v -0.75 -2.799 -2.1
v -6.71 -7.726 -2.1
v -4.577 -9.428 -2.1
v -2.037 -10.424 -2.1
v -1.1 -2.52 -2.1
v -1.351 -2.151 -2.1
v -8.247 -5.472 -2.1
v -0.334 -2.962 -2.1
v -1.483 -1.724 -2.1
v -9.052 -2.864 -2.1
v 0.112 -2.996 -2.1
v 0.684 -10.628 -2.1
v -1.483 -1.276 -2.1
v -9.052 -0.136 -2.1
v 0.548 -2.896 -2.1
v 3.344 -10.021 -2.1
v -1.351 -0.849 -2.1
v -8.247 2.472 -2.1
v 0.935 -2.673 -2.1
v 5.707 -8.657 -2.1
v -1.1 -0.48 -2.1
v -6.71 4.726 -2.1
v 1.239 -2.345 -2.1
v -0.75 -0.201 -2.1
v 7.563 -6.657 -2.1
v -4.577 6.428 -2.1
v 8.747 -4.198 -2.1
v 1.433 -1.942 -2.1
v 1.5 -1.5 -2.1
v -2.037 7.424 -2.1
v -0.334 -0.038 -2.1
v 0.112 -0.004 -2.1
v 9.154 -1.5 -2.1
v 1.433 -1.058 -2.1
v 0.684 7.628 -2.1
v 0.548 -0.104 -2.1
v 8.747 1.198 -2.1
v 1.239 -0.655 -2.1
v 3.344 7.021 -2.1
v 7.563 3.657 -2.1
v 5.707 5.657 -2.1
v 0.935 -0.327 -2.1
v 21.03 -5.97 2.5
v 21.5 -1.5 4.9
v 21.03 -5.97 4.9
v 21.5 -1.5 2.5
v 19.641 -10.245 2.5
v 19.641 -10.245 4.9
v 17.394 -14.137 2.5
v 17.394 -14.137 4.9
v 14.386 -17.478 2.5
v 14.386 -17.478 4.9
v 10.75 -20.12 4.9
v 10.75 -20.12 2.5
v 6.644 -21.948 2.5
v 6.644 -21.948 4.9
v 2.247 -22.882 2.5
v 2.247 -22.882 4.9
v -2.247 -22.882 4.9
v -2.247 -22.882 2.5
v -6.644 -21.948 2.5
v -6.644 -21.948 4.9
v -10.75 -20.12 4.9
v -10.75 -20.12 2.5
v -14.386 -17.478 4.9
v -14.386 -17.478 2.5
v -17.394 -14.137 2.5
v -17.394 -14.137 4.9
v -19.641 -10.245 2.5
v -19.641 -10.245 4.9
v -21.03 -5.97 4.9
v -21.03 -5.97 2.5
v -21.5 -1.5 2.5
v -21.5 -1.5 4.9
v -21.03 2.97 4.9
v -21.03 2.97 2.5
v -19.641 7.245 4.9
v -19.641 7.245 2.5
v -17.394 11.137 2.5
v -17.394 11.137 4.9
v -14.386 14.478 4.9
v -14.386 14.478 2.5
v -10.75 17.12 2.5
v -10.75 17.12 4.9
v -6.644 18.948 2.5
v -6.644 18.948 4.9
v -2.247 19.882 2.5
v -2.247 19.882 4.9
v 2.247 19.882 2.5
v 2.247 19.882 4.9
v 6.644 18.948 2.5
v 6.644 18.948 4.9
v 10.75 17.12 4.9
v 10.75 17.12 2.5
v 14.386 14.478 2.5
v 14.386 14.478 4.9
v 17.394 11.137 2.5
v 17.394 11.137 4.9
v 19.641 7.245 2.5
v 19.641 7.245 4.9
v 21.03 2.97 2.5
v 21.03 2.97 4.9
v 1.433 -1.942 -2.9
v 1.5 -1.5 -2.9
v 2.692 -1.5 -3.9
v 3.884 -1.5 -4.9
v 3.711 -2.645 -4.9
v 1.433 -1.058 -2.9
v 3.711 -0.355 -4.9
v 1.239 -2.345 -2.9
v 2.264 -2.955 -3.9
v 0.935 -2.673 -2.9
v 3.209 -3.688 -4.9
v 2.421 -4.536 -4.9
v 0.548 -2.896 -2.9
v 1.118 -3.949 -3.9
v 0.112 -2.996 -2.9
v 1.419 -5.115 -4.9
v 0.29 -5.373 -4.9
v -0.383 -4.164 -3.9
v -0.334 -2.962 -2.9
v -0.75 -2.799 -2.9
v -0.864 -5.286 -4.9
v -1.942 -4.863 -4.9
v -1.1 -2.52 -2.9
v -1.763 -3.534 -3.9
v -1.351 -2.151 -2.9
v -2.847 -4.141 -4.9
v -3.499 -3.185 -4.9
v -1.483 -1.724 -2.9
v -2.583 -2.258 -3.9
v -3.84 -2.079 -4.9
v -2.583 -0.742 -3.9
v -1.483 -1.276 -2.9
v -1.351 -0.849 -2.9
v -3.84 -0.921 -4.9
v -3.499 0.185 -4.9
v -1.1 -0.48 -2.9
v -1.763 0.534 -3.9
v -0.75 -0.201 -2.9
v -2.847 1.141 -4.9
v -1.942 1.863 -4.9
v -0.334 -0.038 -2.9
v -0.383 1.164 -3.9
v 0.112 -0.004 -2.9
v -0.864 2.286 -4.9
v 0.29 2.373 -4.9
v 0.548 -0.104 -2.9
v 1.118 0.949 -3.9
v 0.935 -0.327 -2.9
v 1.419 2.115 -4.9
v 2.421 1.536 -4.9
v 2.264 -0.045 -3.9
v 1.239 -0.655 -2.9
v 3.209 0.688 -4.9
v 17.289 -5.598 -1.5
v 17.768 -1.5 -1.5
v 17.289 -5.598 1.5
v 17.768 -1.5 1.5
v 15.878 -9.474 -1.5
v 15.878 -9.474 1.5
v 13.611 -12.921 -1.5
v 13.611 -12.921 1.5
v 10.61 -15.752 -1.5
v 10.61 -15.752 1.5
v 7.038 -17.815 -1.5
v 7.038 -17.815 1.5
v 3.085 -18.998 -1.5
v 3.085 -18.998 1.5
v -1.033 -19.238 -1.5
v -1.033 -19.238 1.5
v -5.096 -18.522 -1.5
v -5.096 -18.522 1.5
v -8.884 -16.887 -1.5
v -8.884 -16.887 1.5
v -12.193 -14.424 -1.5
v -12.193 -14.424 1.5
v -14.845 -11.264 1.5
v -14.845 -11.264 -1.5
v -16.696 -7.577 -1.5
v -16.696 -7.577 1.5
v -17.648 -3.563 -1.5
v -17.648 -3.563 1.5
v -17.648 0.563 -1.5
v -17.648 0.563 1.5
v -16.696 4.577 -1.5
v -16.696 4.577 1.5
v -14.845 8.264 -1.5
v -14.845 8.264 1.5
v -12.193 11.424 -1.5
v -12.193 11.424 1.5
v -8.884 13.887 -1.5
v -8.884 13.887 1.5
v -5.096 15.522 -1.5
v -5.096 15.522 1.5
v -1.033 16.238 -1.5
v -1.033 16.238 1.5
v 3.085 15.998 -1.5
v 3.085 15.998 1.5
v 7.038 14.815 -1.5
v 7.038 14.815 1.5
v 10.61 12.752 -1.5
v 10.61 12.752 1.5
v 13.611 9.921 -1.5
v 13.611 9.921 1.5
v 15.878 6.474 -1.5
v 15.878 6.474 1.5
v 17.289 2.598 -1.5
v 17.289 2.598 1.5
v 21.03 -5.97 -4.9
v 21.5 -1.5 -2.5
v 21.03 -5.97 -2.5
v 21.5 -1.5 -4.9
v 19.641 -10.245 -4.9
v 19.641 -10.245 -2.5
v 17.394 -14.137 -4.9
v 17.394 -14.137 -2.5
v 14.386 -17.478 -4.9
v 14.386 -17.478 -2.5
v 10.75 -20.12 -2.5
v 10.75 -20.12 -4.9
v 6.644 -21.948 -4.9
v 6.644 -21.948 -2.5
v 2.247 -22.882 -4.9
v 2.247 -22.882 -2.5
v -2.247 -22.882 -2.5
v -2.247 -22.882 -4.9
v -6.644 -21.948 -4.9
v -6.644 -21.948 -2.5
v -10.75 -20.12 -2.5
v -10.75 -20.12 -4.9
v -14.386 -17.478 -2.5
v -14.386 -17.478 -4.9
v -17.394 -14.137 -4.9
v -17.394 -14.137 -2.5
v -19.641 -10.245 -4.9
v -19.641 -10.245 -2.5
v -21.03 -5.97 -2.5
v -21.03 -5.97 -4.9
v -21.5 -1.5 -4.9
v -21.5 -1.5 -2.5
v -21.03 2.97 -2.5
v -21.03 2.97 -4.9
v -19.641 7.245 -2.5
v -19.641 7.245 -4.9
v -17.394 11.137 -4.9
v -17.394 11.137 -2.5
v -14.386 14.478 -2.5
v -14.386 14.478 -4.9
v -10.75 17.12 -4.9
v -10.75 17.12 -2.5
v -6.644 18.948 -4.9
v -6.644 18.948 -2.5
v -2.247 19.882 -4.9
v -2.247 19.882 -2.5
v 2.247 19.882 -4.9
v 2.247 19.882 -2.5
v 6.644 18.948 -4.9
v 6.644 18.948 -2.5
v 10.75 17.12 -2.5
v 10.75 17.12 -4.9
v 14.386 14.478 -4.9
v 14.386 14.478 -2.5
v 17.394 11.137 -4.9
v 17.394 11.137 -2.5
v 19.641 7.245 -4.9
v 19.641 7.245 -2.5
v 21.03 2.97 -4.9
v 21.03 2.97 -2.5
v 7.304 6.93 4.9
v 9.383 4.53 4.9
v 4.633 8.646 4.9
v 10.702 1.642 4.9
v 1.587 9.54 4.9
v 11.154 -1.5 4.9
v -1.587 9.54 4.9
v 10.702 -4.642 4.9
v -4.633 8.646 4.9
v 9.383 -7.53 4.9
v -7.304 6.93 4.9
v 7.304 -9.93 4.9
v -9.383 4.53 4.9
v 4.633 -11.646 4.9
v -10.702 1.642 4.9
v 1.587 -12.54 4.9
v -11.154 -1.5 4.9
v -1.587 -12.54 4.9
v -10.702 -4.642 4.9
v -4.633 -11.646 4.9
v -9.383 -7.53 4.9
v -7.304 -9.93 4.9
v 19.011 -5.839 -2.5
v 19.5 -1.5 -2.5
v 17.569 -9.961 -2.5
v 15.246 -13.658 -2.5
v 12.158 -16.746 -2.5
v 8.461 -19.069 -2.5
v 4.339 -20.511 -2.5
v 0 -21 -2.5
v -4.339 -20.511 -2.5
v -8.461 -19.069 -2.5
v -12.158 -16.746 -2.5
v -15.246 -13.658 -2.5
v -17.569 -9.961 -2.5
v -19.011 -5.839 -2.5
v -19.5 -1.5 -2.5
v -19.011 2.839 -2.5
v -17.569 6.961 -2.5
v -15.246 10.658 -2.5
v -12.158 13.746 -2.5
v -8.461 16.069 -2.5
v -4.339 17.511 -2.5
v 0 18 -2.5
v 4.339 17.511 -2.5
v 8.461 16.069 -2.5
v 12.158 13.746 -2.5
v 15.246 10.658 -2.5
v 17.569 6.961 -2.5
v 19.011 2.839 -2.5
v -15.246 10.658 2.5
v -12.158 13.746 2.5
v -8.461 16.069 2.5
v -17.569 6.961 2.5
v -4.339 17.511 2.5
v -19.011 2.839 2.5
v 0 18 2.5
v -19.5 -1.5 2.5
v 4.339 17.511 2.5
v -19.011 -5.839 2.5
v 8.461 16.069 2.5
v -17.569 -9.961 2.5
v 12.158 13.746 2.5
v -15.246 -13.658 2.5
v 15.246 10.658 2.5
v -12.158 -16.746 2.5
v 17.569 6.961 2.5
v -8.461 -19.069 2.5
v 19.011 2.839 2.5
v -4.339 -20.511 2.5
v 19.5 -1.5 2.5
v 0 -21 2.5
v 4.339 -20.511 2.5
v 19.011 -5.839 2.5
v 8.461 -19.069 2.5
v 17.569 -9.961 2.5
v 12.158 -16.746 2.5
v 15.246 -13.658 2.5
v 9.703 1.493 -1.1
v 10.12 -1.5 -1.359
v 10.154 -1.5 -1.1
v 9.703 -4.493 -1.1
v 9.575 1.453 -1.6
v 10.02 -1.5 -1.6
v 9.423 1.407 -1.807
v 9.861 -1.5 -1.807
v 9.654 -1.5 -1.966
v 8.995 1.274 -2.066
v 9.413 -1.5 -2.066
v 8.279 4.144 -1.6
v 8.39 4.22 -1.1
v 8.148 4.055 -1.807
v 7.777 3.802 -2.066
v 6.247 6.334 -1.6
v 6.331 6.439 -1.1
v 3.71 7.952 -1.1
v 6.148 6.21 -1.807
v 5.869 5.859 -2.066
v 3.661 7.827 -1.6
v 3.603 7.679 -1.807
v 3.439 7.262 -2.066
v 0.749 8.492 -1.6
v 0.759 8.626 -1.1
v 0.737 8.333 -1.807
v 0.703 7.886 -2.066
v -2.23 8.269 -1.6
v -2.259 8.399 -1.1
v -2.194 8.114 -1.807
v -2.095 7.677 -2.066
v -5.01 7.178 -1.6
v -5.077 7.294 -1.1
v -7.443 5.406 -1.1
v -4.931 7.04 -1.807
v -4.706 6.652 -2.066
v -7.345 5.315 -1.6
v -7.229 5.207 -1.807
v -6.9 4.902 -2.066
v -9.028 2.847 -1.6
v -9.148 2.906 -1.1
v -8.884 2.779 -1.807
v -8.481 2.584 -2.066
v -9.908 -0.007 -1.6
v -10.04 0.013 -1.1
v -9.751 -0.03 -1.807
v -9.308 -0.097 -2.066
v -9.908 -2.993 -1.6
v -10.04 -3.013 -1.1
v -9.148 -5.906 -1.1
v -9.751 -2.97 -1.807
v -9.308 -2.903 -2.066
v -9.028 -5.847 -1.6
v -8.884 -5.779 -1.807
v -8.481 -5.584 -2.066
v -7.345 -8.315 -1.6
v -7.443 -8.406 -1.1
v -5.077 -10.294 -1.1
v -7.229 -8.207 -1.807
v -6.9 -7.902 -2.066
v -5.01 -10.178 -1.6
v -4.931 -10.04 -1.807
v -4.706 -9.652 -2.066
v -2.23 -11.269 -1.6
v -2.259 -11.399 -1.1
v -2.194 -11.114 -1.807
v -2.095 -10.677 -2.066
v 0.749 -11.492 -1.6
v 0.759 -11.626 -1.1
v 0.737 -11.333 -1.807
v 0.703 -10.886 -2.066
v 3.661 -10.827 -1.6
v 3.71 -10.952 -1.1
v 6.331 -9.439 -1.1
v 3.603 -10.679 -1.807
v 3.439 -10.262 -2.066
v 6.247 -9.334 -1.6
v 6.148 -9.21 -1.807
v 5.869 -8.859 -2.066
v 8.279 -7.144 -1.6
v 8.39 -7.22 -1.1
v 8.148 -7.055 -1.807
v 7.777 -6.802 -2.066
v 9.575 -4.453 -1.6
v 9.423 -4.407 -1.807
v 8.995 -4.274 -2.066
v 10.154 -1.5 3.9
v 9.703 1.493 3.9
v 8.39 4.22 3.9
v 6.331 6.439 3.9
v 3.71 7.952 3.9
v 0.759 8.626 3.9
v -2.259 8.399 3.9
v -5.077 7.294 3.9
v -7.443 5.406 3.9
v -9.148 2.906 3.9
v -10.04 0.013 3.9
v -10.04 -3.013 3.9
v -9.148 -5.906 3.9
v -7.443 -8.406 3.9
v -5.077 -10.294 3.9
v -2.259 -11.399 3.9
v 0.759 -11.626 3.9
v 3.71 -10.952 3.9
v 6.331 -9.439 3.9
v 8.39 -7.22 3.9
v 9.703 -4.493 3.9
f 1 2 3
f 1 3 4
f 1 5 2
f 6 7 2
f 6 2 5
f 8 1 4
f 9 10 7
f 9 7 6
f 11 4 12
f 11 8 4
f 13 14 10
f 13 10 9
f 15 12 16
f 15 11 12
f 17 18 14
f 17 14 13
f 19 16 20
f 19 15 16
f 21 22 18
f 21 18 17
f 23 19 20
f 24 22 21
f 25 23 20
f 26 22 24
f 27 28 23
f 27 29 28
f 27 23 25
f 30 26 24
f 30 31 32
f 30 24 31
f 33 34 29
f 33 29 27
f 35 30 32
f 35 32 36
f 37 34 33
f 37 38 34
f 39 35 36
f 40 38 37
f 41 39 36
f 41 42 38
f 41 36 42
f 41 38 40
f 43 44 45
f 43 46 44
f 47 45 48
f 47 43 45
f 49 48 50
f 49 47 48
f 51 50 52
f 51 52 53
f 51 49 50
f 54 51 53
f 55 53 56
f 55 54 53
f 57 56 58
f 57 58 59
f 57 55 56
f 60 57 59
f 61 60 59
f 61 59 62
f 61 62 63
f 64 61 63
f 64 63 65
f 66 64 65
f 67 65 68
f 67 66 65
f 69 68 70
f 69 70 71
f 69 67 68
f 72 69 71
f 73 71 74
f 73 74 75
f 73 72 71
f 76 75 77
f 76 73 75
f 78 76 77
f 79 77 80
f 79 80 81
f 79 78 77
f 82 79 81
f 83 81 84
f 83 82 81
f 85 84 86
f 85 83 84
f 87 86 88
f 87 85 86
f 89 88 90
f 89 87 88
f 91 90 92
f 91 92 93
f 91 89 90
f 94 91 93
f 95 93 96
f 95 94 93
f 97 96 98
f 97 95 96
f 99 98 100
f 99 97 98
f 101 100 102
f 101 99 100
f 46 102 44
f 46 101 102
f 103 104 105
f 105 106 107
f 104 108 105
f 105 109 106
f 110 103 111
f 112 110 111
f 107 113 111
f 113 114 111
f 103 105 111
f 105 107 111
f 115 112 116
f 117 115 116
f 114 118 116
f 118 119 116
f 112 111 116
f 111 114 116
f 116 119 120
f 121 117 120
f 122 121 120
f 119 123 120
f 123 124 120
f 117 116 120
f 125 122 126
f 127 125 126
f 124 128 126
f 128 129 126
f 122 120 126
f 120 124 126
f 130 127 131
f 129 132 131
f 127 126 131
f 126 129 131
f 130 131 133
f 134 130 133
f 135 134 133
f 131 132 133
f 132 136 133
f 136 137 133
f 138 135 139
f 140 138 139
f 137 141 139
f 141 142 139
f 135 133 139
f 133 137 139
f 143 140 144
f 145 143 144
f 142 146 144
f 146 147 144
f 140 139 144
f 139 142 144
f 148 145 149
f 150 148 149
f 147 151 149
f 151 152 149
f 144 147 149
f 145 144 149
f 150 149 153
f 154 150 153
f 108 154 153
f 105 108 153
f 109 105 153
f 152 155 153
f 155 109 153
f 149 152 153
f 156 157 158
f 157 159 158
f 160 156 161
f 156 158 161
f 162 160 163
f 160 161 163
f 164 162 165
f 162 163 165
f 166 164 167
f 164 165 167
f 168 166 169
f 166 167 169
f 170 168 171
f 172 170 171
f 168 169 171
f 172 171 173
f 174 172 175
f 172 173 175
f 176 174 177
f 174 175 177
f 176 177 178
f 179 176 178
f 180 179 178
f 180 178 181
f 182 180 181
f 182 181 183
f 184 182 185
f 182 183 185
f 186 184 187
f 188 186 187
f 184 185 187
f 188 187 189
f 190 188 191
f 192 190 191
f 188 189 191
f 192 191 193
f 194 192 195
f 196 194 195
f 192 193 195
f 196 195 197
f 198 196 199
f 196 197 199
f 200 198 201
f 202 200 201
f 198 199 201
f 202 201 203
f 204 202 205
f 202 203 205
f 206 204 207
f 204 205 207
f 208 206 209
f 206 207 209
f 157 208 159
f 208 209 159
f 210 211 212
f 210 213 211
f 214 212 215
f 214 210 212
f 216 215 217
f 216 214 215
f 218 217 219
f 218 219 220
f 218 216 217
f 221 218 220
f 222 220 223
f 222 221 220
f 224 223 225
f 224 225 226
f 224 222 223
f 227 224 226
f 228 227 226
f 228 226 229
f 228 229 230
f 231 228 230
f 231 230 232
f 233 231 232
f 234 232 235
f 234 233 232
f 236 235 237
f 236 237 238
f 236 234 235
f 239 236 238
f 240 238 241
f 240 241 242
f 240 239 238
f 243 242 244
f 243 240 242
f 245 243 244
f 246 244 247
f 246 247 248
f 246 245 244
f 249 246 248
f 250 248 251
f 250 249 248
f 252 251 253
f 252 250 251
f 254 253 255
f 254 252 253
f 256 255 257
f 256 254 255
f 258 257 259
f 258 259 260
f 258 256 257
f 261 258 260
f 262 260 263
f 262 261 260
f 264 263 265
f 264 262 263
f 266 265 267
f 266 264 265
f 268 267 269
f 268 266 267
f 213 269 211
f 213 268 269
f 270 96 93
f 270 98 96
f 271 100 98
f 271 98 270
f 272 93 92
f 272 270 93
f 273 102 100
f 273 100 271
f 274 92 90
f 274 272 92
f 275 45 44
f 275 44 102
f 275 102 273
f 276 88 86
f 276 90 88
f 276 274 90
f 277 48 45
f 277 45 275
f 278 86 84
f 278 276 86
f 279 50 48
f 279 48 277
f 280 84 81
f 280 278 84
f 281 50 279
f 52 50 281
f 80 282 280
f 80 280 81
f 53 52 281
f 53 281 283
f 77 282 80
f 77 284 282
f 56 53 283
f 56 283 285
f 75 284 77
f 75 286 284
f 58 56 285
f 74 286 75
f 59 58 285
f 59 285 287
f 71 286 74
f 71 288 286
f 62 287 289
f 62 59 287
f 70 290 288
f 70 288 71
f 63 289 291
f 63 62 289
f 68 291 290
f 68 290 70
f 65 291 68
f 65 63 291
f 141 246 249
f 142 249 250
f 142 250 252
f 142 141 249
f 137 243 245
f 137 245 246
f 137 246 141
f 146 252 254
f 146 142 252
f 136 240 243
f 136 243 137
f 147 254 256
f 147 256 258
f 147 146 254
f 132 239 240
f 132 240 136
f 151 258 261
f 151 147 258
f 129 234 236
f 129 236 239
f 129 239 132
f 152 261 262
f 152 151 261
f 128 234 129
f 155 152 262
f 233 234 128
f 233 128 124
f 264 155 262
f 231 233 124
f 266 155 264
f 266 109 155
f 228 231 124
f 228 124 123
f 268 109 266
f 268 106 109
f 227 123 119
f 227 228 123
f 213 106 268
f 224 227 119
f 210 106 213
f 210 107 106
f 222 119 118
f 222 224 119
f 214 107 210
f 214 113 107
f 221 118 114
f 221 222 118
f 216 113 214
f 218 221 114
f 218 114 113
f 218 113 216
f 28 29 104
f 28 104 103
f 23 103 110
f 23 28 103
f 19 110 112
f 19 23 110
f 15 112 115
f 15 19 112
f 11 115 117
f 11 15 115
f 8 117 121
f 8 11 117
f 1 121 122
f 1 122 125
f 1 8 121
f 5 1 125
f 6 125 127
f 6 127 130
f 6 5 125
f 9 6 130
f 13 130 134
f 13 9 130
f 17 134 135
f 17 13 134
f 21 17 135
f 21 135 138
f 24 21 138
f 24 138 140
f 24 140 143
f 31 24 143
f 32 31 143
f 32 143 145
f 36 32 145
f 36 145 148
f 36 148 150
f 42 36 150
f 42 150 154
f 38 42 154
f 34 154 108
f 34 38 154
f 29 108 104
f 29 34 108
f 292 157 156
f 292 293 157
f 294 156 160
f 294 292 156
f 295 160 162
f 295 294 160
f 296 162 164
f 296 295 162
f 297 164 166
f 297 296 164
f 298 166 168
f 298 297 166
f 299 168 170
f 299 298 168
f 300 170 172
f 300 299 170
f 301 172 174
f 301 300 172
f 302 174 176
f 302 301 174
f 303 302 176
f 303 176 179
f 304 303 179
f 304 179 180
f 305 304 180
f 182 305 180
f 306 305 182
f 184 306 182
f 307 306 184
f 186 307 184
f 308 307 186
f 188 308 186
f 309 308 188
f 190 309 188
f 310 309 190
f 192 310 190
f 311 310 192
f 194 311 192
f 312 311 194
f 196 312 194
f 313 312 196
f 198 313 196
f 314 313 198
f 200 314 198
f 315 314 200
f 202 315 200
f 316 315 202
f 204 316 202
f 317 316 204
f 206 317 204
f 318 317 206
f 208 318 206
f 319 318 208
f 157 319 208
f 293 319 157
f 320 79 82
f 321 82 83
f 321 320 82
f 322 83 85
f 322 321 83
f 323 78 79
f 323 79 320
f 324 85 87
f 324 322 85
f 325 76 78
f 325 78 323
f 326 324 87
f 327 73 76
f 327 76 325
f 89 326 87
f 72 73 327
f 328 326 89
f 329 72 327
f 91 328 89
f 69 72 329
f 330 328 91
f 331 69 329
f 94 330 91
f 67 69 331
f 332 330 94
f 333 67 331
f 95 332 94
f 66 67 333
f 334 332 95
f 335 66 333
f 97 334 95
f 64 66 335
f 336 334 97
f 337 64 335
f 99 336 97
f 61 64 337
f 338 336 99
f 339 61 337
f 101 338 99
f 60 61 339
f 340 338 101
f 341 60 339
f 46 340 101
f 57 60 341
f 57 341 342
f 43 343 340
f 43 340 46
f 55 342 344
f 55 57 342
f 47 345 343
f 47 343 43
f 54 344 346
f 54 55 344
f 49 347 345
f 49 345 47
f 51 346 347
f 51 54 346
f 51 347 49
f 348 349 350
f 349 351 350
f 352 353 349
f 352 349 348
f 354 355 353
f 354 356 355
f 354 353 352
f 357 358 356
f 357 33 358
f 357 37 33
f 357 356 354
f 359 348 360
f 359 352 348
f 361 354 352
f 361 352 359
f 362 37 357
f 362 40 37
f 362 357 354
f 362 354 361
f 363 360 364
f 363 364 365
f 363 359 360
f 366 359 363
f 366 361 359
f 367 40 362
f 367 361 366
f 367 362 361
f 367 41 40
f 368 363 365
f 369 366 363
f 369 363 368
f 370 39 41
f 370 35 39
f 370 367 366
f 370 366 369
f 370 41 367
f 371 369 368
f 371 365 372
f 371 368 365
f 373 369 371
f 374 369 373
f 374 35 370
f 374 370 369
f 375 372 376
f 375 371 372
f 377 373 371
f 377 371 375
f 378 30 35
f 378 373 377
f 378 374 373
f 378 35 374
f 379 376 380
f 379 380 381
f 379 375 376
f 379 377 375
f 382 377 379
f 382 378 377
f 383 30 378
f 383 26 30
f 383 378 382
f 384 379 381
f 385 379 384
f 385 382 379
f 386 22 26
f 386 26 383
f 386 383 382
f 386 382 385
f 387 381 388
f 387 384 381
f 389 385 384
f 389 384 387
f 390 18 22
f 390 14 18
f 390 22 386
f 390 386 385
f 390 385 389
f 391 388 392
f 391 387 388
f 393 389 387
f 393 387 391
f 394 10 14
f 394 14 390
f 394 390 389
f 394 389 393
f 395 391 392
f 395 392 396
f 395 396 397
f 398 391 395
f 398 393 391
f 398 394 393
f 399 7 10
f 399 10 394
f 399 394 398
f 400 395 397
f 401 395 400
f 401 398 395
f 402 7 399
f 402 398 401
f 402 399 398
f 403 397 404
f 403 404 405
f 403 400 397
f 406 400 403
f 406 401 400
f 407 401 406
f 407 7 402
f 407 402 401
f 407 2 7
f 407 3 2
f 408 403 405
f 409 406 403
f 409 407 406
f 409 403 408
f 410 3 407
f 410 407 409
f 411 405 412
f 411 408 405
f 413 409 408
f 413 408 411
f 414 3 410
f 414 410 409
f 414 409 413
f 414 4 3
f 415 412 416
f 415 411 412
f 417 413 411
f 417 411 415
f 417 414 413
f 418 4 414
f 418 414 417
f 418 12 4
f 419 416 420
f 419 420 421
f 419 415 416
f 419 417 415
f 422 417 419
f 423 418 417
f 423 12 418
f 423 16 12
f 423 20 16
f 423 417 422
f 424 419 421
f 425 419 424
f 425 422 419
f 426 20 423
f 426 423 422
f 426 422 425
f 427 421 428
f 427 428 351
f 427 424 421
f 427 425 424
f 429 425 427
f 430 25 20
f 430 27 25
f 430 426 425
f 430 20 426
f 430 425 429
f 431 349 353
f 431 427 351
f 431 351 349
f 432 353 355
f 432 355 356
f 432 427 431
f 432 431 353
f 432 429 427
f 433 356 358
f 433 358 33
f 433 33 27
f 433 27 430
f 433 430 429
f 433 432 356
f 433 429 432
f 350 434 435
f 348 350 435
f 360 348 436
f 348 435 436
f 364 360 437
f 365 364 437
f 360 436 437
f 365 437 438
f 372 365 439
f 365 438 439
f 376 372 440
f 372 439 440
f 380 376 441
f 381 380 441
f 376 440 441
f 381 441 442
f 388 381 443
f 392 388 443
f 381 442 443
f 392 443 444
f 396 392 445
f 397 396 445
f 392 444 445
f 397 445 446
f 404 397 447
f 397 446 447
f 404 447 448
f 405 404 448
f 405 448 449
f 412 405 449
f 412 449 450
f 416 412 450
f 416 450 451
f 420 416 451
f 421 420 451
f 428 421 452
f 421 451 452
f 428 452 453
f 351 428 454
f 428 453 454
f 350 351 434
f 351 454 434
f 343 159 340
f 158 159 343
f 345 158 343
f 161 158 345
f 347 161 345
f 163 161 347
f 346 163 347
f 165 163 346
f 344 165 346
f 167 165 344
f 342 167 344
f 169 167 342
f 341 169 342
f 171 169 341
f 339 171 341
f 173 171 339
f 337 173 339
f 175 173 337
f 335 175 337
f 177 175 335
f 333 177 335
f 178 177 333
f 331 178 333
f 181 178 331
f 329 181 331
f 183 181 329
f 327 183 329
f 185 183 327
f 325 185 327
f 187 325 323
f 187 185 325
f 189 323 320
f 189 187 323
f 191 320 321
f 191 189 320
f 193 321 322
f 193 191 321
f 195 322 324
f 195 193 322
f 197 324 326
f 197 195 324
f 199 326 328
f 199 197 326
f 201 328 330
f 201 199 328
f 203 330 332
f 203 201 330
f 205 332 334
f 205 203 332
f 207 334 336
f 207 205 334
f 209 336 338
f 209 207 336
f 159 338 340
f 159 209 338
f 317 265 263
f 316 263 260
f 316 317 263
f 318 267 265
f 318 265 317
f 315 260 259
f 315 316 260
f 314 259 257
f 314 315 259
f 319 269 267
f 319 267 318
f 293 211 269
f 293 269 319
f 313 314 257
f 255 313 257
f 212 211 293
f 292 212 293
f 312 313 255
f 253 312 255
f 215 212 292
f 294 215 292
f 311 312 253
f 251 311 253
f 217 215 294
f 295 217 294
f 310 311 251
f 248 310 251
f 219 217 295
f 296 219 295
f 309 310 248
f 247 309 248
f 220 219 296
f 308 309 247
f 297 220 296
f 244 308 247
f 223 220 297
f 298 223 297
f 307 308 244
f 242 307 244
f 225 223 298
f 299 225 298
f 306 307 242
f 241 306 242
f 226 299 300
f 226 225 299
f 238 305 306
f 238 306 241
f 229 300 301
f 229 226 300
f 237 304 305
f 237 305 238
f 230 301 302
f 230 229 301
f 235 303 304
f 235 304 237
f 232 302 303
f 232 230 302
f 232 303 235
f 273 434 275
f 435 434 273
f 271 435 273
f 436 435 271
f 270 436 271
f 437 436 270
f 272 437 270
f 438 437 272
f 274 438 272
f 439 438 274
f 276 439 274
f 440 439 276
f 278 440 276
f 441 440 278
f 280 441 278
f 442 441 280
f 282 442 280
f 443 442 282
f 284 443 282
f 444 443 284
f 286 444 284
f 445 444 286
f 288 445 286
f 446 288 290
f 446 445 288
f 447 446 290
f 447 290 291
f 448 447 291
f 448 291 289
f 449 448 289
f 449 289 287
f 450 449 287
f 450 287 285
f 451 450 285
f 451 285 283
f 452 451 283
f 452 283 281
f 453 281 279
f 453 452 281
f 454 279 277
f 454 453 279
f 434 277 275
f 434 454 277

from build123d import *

# Parameters (mm, degrees)
ESBO_O5_R             = 10.153899328
CORTE_EXTRUS_O1_DEPTH = 7
CHANFRO1_SIZE         = 1
FILETE1_R             = 1
CHANFRO2_SIZE         = 2
CHANFRO2_SIZE2        = 2.383507185


with BuildPart() as part:
    # Esboço4 → Revolução1 (revolve)
    with BuildSketch(Plane(origin=(0, 0, 0), x_dir=(0, 0, -1), z_dir=(1, 0, 0)), mode=Mode.PRIVATE) as revolu_o1_sk:
        Polygon((-4.9, 0), (-4.9, 20), (-2.5, 20), (-2.5, 18), (-1.5, 16.267949192), (0, 16.267949192), (1.5, 16.267949192), (2.5, 18), (2.5, 20), (4.9, 20), (4.9, 0), align=None)
    revolve(revolu_o1_sk.sketch.rotate(Axis((0, -1.5, 9.058267024), (0, 0, -1)), 90), axis=Axis((0, -1.5, 9.058267024), (0, 0, -1)))

    # Esboço5 → Corte-extrusão1 (cut)
    with BuildSketch(Plane.XY.offset(4.9)):
        with Locations((0, -1.5)):
            Circle(ESBO_O5_R)
    extrude(amount=-CORTE_EXTRUS_O1_DEPTH, mode=Mode.SUBTRACT)

    # Chanfro1
    chanfro1_edges = [part.edges().sort_by_distance(p)[0] for p in [
        (-10.153899328, -1.5, 4.9),
    ]]
    chamfer(chanfro1_edges, length=CHANFRO1_SIZE)

    # Filete1
    filete1_edges = [part.edges().sort_by_distance(p)[0] for p in [
        (-10.153899328, -1.5, -2.1),
    ]]
    fillet(filete1_edges, radius=FILETE1_R)

    # Chanfro2
    chanfro2_edges = [part.edges().sort_by_distance(p)[0] for p in [
        (-1.5, -1.5, -4.9),
    ]]
    chanfro2_side = [part.faces().sort_by_distance(p)[0] for p in [
        (-1.5, -1.5, -3.5),
    ]]
    chamfer(chanfro2_edges, length=CHANFRO2_SIZE, length2=CHANFRO2_SIZE2, reference=chanfro2_side[0])


solid = part.part
